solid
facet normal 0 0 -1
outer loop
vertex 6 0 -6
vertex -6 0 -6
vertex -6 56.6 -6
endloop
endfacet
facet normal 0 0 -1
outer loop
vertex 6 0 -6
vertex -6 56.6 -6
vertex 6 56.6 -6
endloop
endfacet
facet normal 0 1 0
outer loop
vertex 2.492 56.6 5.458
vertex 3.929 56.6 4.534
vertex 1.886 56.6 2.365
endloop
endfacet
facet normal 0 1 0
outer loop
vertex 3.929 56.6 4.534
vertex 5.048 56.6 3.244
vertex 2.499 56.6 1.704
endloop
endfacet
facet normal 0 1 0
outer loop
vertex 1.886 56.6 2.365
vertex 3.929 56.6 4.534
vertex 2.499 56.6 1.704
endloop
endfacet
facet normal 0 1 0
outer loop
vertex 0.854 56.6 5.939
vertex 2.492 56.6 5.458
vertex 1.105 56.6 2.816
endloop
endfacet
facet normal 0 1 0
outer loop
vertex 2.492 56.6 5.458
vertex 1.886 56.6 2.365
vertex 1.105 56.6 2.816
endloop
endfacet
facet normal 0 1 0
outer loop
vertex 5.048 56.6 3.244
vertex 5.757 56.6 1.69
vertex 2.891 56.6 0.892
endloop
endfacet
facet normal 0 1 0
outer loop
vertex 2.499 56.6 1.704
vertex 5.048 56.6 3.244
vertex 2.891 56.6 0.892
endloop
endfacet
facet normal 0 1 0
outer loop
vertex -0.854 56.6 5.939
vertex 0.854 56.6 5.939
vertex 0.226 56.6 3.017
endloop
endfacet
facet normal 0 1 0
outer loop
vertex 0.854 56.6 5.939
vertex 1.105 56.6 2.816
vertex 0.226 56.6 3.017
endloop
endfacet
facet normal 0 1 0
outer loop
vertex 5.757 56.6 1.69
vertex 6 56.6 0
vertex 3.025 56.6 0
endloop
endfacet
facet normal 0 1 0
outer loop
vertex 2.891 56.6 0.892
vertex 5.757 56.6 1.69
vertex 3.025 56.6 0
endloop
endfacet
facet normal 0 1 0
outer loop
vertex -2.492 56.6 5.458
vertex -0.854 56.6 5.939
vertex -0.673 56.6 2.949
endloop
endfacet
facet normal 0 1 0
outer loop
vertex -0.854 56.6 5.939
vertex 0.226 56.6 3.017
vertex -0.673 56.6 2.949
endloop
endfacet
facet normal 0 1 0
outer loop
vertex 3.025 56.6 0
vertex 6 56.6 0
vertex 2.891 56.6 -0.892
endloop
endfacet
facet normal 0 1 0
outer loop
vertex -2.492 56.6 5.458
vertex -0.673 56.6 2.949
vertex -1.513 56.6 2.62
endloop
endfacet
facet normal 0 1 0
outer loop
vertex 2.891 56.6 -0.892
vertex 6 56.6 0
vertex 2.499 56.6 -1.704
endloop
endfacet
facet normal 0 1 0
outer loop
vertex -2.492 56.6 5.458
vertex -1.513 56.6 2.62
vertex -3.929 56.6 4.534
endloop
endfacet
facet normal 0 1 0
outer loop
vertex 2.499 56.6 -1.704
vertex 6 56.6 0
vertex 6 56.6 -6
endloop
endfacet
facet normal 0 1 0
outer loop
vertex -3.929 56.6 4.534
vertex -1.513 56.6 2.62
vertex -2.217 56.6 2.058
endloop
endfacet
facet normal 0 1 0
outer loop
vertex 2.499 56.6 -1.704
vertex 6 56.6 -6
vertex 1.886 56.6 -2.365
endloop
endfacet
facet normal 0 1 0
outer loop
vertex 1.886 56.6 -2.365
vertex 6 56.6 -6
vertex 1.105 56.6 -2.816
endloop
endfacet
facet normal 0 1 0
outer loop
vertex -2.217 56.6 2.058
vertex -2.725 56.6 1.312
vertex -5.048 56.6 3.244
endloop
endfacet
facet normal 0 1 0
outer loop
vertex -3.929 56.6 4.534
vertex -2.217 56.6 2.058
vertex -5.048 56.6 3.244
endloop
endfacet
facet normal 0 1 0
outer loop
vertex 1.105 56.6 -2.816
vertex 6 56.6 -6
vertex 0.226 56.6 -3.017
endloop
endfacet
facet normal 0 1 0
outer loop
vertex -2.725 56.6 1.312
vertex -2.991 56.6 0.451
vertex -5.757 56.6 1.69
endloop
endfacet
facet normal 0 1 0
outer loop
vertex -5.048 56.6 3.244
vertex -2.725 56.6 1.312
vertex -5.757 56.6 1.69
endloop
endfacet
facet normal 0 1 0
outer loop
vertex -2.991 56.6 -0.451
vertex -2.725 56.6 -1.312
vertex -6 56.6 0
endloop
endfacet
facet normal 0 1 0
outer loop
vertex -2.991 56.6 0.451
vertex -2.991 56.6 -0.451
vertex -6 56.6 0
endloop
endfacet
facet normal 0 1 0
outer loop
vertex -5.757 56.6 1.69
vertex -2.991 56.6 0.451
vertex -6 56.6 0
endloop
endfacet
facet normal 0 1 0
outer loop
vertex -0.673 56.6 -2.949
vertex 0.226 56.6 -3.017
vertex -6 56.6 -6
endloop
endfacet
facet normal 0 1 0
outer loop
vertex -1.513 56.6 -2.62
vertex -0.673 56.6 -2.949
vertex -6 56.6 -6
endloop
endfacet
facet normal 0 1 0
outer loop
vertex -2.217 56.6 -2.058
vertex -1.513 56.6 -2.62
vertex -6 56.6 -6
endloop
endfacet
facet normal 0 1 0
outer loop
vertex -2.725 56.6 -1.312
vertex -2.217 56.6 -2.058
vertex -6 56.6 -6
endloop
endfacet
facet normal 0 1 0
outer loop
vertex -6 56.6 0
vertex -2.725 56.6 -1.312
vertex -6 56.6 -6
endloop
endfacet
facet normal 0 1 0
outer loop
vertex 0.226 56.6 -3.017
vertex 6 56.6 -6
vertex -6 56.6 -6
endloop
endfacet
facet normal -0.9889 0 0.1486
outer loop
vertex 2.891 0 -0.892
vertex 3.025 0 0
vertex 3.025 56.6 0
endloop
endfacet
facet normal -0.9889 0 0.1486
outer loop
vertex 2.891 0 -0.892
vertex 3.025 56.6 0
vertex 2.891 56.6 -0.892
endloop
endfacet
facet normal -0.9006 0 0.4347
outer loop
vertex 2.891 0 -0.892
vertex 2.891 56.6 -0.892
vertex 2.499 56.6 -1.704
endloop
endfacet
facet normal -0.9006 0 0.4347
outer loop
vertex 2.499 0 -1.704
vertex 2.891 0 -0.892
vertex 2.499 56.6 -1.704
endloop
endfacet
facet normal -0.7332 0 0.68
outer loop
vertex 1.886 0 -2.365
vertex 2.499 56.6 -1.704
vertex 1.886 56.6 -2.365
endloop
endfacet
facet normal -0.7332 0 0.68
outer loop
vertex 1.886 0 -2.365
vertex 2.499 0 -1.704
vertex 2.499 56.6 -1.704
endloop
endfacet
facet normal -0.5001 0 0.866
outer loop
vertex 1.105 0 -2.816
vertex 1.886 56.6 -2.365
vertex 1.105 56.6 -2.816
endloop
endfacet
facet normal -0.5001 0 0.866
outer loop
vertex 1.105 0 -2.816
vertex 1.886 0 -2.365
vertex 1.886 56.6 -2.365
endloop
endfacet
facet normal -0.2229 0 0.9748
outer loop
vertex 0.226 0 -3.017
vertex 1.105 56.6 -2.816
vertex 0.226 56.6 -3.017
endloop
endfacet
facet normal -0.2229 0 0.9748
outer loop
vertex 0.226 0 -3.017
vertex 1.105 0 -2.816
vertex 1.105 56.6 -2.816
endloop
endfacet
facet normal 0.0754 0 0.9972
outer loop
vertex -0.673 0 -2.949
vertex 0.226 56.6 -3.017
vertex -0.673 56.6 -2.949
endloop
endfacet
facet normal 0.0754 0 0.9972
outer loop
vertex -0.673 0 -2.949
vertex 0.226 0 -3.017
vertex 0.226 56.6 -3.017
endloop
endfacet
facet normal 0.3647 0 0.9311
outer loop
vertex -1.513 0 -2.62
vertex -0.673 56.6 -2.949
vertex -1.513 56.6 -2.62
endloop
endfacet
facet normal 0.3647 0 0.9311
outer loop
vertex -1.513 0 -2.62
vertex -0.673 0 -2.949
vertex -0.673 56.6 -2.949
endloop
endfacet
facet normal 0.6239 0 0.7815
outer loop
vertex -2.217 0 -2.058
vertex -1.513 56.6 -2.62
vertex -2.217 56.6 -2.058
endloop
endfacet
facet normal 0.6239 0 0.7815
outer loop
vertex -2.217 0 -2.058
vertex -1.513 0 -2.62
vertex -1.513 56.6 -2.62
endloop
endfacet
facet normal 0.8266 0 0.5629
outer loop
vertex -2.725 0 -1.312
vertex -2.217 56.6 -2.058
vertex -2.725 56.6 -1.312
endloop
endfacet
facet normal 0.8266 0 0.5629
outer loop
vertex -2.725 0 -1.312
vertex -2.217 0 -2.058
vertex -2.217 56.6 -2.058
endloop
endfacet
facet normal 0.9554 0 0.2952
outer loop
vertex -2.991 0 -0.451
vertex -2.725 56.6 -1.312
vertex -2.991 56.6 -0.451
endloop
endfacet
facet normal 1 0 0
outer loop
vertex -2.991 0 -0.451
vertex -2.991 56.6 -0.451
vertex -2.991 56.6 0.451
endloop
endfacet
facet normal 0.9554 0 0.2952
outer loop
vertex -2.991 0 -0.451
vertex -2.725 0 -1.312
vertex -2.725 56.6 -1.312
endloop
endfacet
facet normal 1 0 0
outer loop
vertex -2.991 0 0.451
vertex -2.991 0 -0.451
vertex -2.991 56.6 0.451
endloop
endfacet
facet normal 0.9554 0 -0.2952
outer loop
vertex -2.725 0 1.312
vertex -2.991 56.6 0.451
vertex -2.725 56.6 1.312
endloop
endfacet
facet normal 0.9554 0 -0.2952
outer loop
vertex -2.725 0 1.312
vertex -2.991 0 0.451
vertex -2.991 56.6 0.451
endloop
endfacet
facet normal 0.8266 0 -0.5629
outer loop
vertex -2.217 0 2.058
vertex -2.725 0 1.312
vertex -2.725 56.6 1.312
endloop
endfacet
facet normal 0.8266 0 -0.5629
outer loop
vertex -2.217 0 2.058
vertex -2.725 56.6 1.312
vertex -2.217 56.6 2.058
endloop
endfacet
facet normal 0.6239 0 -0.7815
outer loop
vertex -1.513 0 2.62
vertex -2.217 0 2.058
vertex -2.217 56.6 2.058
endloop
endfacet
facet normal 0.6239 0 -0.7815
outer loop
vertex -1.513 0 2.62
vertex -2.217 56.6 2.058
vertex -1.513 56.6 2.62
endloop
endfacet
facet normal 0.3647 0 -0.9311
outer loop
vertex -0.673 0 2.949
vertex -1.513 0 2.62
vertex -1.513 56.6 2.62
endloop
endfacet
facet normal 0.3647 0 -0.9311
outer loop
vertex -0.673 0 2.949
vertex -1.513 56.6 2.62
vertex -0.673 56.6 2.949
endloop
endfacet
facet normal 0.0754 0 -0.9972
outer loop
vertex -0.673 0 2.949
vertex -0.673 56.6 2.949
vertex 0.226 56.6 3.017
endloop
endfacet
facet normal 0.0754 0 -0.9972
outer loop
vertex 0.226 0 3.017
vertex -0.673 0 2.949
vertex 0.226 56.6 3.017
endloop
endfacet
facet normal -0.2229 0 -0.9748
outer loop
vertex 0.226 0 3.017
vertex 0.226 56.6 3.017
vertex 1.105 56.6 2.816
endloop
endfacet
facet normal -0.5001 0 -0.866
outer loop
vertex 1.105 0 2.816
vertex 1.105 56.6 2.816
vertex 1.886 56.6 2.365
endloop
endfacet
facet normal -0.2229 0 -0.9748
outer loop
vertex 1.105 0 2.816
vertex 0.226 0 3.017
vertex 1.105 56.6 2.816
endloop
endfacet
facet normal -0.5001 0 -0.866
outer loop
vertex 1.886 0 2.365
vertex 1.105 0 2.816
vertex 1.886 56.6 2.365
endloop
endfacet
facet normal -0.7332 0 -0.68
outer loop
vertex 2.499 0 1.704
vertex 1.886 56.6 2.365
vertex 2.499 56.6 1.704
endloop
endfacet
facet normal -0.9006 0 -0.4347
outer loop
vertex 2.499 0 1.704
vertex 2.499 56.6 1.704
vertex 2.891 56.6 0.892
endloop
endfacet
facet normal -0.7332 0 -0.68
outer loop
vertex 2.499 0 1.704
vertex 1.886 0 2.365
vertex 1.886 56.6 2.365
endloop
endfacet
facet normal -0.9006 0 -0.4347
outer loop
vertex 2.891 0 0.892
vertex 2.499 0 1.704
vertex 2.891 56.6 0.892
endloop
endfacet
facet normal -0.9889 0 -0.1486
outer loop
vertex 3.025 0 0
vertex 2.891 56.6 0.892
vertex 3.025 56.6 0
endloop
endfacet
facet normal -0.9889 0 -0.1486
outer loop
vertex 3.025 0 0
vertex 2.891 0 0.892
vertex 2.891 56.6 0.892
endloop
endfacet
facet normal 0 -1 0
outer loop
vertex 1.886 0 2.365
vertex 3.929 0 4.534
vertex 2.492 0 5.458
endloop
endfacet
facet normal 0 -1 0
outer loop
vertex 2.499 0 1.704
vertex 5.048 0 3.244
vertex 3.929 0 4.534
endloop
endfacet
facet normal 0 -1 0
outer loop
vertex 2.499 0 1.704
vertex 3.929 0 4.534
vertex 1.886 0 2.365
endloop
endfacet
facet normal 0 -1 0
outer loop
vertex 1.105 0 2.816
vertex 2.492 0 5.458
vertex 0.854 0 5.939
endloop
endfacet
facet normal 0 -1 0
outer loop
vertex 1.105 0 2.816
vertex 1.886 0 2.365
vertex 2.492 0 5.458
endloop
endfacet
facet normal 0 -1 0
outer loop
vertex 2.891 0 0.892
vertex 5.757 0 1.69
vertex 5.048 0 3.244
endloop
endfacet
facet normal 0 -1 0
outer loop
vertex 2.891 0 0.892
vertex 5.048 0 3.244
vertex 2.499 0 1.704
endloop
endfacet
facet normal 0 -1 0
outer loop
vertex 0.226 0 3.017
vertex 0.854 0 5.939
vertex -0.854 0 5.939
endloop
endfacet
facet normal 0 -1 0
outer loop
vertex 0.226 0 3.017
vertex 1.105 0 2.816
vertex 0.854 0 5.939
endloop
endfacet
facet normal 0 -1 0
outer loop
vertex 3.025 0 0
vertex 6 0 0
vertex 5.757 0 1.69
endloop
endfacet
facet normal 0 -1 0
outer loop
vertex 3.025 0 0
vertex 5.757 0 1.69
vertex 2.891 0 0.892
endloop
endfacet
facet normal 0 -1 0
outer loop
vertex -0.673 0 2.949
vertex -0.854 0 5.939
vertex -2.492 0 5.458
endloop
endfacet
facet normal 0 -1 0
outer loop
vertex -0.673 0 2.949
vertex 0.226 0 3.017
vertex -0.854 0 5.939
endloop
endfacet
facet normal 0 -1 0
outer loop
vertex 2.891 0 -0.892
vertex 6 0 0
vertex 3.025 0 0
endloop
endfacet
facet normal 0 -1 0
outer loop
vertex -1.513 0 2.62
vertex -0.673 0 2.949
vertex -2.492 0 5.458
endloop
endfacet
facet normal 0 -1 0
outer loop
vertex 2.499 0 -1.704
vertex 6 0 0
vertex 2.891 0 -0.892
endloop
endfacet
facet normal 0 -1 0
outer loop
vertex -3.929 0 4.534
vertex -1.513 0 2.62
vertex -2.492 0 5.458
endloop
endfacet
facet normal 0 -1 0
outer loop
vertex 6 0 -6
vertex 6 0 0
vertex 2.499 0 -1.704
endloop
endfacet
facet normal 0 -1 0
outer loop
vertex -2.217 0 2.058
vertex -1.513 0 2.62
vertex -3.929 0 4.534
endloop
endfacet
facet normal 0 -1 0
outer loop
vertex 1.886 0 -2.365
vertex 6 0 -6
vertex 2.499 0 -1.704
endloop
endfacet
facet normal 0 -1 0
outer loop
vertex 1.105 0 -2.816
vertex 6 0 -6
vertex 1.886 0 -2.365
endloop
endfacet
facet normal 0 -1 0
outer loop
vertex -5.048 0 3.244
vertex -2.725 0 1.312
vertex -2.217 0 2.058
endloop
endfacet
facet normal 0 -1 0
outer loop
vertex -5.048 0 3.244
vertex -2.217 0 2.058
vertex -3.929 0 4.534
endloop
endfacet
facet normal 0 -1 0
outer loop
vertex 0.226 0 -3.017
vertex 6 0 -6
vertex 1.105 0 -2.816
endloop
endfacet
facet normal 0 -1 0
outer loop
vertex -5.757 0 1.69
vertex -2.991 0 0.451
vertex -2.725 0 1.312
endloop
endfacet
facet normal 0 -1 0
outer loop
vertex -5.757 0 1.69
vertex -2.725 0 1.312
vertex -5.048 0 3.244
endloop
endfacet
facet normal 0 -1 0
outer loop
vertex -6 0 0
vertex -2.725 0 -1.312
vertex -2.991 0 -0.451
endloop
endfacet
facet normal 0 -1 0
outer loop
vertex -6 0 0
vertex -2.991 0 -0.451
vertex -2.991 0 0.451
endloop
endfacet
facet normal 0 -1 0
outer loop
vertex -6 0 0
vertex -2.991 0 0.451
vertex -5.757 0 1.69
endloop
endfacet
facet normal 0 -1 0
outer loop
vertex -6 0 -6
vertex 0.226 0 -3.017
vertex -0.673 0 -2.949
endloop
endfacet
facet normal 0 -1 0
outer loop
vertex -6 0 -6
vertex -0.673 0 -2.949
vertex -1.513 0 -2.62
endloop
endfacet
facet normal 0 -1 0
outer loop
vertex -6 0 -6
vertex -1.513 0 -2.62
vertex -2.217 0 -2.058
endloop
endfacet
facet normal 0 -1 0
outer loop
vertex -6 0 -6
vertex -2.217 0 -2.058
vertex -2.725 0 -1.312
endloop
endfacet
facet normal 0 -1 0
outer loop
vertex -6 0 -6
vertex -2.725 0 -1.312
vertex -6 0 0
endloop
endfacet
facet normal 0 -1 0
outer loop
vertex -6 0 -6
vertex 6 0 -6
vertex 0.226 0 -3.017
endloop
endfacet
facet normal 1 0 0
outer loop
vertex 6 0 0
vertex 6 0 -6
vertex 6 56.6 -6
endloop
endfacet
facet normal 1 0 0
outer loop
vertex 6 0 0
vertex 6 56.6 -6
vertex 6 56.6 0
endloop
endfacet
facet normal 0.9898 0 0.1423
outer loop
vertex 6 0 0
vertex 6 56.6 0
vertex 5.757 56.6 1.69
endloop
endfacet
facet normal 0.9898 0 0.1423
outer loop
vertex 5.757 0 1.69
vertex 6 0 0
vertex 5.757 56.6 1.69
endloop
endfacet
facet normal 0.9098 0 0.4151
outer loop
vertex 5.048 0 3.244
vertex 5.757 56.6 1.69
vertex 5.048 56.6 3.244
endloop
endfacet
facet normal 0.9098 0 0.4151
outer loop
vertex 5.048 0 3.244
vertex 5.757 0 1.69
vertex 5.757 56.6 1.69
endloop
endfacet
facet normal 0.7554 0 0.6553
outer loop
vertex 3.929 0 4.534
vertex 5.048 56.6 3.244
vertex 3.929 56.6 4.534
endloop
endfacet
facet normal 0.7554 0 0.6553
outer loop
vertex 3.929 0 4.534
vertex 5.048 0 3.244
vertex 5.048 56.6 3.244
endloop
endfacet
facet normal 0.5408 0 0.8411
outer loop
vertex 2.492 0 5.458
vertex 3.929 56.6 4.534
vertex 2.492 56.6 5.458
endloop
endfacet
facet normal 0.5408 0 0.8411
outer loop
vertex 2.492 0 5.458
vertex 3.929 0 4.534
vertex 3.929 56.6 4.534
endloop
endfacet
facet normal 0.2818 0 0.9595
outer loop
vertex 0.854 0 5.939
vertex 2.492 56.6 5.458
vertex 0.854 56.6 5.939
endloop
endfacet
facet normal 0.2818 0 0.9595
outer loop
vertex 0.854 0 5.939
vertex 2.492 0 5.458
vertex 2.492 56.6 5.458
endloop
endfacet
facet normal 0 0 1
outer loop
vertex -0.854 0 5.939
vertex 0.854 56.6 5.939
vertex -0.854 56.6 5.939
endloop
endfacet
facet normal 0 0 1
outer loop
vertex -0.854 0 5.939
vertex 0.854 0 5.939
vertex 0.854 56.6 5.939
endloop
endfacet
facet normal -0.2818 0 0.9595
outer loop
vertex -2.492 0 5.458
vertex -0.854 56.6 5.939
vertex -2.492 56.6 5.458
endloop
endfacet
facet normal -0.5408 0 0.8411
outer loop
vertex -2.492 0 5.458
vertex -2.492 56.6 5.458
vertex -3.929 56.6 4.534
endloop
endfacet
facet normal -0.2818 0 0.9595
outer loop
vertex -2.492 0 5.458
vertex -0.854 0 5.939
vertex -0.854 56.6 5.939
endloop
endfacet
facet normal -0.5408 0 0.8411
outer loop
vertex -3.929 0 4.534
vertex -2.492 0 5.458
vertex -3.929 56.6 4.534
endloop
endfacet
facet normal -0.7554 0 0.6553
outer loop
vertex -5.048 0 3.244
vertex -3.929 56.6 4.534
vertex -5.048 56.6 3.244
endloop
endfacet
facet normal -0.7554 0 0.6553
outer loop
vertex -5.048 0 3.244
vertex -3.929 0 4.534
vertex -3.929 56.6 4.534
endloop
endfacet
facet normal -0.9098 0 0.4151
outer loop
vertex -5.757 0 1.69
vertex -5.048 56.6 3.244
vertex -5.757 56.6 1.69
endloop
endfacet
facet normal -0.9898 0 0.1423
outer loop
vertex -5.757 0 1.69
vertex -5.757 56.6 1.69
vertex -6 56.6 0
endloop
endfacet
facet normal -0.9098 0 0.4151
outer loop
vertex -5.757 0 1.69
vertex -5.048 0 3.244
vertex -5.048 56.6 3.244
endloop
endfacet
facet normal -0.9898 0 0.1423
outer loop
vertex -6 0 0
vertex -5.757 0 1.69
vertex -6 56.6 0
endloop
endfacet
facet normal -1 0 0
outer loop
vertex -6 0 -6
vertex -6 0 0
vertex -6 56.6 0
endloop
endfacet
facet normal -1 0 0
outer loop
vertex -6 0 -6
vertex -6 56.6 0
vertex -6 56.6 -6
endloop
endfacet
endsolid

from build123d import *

# Parameters (mm, degrees)
SKETCH1_R           = 3.025
BOSS_EXTRUDE1_DEPTH = 56.6


with BuildPart() as part:
    # Sketch1 → Boss-Extrude1 (new body)
    with BuildSketch(Plane(origin=(0, 0, 0), x_dir=(1, 0, 0), z_dir=(0, 1, 0))):
        with BuildLine():
            Line((-6, 0), (-6, 5.43))
            Line((-6, 5.43), (-6, 6))
            Line((-6, 6), (6, 6))
            Line((6, 6), (6, 5.43))
            Line((6, 5.43), (6, 0))
            ThreePointArc((6, 0), (0, -6), (-6, 0))
        make_face()
        Circle(SKETCH1_R, mode=Mode.SUBTRACT)
    extrude(amount=BOSS_EXTRUDE1_DEPTH)


solid = part.part
